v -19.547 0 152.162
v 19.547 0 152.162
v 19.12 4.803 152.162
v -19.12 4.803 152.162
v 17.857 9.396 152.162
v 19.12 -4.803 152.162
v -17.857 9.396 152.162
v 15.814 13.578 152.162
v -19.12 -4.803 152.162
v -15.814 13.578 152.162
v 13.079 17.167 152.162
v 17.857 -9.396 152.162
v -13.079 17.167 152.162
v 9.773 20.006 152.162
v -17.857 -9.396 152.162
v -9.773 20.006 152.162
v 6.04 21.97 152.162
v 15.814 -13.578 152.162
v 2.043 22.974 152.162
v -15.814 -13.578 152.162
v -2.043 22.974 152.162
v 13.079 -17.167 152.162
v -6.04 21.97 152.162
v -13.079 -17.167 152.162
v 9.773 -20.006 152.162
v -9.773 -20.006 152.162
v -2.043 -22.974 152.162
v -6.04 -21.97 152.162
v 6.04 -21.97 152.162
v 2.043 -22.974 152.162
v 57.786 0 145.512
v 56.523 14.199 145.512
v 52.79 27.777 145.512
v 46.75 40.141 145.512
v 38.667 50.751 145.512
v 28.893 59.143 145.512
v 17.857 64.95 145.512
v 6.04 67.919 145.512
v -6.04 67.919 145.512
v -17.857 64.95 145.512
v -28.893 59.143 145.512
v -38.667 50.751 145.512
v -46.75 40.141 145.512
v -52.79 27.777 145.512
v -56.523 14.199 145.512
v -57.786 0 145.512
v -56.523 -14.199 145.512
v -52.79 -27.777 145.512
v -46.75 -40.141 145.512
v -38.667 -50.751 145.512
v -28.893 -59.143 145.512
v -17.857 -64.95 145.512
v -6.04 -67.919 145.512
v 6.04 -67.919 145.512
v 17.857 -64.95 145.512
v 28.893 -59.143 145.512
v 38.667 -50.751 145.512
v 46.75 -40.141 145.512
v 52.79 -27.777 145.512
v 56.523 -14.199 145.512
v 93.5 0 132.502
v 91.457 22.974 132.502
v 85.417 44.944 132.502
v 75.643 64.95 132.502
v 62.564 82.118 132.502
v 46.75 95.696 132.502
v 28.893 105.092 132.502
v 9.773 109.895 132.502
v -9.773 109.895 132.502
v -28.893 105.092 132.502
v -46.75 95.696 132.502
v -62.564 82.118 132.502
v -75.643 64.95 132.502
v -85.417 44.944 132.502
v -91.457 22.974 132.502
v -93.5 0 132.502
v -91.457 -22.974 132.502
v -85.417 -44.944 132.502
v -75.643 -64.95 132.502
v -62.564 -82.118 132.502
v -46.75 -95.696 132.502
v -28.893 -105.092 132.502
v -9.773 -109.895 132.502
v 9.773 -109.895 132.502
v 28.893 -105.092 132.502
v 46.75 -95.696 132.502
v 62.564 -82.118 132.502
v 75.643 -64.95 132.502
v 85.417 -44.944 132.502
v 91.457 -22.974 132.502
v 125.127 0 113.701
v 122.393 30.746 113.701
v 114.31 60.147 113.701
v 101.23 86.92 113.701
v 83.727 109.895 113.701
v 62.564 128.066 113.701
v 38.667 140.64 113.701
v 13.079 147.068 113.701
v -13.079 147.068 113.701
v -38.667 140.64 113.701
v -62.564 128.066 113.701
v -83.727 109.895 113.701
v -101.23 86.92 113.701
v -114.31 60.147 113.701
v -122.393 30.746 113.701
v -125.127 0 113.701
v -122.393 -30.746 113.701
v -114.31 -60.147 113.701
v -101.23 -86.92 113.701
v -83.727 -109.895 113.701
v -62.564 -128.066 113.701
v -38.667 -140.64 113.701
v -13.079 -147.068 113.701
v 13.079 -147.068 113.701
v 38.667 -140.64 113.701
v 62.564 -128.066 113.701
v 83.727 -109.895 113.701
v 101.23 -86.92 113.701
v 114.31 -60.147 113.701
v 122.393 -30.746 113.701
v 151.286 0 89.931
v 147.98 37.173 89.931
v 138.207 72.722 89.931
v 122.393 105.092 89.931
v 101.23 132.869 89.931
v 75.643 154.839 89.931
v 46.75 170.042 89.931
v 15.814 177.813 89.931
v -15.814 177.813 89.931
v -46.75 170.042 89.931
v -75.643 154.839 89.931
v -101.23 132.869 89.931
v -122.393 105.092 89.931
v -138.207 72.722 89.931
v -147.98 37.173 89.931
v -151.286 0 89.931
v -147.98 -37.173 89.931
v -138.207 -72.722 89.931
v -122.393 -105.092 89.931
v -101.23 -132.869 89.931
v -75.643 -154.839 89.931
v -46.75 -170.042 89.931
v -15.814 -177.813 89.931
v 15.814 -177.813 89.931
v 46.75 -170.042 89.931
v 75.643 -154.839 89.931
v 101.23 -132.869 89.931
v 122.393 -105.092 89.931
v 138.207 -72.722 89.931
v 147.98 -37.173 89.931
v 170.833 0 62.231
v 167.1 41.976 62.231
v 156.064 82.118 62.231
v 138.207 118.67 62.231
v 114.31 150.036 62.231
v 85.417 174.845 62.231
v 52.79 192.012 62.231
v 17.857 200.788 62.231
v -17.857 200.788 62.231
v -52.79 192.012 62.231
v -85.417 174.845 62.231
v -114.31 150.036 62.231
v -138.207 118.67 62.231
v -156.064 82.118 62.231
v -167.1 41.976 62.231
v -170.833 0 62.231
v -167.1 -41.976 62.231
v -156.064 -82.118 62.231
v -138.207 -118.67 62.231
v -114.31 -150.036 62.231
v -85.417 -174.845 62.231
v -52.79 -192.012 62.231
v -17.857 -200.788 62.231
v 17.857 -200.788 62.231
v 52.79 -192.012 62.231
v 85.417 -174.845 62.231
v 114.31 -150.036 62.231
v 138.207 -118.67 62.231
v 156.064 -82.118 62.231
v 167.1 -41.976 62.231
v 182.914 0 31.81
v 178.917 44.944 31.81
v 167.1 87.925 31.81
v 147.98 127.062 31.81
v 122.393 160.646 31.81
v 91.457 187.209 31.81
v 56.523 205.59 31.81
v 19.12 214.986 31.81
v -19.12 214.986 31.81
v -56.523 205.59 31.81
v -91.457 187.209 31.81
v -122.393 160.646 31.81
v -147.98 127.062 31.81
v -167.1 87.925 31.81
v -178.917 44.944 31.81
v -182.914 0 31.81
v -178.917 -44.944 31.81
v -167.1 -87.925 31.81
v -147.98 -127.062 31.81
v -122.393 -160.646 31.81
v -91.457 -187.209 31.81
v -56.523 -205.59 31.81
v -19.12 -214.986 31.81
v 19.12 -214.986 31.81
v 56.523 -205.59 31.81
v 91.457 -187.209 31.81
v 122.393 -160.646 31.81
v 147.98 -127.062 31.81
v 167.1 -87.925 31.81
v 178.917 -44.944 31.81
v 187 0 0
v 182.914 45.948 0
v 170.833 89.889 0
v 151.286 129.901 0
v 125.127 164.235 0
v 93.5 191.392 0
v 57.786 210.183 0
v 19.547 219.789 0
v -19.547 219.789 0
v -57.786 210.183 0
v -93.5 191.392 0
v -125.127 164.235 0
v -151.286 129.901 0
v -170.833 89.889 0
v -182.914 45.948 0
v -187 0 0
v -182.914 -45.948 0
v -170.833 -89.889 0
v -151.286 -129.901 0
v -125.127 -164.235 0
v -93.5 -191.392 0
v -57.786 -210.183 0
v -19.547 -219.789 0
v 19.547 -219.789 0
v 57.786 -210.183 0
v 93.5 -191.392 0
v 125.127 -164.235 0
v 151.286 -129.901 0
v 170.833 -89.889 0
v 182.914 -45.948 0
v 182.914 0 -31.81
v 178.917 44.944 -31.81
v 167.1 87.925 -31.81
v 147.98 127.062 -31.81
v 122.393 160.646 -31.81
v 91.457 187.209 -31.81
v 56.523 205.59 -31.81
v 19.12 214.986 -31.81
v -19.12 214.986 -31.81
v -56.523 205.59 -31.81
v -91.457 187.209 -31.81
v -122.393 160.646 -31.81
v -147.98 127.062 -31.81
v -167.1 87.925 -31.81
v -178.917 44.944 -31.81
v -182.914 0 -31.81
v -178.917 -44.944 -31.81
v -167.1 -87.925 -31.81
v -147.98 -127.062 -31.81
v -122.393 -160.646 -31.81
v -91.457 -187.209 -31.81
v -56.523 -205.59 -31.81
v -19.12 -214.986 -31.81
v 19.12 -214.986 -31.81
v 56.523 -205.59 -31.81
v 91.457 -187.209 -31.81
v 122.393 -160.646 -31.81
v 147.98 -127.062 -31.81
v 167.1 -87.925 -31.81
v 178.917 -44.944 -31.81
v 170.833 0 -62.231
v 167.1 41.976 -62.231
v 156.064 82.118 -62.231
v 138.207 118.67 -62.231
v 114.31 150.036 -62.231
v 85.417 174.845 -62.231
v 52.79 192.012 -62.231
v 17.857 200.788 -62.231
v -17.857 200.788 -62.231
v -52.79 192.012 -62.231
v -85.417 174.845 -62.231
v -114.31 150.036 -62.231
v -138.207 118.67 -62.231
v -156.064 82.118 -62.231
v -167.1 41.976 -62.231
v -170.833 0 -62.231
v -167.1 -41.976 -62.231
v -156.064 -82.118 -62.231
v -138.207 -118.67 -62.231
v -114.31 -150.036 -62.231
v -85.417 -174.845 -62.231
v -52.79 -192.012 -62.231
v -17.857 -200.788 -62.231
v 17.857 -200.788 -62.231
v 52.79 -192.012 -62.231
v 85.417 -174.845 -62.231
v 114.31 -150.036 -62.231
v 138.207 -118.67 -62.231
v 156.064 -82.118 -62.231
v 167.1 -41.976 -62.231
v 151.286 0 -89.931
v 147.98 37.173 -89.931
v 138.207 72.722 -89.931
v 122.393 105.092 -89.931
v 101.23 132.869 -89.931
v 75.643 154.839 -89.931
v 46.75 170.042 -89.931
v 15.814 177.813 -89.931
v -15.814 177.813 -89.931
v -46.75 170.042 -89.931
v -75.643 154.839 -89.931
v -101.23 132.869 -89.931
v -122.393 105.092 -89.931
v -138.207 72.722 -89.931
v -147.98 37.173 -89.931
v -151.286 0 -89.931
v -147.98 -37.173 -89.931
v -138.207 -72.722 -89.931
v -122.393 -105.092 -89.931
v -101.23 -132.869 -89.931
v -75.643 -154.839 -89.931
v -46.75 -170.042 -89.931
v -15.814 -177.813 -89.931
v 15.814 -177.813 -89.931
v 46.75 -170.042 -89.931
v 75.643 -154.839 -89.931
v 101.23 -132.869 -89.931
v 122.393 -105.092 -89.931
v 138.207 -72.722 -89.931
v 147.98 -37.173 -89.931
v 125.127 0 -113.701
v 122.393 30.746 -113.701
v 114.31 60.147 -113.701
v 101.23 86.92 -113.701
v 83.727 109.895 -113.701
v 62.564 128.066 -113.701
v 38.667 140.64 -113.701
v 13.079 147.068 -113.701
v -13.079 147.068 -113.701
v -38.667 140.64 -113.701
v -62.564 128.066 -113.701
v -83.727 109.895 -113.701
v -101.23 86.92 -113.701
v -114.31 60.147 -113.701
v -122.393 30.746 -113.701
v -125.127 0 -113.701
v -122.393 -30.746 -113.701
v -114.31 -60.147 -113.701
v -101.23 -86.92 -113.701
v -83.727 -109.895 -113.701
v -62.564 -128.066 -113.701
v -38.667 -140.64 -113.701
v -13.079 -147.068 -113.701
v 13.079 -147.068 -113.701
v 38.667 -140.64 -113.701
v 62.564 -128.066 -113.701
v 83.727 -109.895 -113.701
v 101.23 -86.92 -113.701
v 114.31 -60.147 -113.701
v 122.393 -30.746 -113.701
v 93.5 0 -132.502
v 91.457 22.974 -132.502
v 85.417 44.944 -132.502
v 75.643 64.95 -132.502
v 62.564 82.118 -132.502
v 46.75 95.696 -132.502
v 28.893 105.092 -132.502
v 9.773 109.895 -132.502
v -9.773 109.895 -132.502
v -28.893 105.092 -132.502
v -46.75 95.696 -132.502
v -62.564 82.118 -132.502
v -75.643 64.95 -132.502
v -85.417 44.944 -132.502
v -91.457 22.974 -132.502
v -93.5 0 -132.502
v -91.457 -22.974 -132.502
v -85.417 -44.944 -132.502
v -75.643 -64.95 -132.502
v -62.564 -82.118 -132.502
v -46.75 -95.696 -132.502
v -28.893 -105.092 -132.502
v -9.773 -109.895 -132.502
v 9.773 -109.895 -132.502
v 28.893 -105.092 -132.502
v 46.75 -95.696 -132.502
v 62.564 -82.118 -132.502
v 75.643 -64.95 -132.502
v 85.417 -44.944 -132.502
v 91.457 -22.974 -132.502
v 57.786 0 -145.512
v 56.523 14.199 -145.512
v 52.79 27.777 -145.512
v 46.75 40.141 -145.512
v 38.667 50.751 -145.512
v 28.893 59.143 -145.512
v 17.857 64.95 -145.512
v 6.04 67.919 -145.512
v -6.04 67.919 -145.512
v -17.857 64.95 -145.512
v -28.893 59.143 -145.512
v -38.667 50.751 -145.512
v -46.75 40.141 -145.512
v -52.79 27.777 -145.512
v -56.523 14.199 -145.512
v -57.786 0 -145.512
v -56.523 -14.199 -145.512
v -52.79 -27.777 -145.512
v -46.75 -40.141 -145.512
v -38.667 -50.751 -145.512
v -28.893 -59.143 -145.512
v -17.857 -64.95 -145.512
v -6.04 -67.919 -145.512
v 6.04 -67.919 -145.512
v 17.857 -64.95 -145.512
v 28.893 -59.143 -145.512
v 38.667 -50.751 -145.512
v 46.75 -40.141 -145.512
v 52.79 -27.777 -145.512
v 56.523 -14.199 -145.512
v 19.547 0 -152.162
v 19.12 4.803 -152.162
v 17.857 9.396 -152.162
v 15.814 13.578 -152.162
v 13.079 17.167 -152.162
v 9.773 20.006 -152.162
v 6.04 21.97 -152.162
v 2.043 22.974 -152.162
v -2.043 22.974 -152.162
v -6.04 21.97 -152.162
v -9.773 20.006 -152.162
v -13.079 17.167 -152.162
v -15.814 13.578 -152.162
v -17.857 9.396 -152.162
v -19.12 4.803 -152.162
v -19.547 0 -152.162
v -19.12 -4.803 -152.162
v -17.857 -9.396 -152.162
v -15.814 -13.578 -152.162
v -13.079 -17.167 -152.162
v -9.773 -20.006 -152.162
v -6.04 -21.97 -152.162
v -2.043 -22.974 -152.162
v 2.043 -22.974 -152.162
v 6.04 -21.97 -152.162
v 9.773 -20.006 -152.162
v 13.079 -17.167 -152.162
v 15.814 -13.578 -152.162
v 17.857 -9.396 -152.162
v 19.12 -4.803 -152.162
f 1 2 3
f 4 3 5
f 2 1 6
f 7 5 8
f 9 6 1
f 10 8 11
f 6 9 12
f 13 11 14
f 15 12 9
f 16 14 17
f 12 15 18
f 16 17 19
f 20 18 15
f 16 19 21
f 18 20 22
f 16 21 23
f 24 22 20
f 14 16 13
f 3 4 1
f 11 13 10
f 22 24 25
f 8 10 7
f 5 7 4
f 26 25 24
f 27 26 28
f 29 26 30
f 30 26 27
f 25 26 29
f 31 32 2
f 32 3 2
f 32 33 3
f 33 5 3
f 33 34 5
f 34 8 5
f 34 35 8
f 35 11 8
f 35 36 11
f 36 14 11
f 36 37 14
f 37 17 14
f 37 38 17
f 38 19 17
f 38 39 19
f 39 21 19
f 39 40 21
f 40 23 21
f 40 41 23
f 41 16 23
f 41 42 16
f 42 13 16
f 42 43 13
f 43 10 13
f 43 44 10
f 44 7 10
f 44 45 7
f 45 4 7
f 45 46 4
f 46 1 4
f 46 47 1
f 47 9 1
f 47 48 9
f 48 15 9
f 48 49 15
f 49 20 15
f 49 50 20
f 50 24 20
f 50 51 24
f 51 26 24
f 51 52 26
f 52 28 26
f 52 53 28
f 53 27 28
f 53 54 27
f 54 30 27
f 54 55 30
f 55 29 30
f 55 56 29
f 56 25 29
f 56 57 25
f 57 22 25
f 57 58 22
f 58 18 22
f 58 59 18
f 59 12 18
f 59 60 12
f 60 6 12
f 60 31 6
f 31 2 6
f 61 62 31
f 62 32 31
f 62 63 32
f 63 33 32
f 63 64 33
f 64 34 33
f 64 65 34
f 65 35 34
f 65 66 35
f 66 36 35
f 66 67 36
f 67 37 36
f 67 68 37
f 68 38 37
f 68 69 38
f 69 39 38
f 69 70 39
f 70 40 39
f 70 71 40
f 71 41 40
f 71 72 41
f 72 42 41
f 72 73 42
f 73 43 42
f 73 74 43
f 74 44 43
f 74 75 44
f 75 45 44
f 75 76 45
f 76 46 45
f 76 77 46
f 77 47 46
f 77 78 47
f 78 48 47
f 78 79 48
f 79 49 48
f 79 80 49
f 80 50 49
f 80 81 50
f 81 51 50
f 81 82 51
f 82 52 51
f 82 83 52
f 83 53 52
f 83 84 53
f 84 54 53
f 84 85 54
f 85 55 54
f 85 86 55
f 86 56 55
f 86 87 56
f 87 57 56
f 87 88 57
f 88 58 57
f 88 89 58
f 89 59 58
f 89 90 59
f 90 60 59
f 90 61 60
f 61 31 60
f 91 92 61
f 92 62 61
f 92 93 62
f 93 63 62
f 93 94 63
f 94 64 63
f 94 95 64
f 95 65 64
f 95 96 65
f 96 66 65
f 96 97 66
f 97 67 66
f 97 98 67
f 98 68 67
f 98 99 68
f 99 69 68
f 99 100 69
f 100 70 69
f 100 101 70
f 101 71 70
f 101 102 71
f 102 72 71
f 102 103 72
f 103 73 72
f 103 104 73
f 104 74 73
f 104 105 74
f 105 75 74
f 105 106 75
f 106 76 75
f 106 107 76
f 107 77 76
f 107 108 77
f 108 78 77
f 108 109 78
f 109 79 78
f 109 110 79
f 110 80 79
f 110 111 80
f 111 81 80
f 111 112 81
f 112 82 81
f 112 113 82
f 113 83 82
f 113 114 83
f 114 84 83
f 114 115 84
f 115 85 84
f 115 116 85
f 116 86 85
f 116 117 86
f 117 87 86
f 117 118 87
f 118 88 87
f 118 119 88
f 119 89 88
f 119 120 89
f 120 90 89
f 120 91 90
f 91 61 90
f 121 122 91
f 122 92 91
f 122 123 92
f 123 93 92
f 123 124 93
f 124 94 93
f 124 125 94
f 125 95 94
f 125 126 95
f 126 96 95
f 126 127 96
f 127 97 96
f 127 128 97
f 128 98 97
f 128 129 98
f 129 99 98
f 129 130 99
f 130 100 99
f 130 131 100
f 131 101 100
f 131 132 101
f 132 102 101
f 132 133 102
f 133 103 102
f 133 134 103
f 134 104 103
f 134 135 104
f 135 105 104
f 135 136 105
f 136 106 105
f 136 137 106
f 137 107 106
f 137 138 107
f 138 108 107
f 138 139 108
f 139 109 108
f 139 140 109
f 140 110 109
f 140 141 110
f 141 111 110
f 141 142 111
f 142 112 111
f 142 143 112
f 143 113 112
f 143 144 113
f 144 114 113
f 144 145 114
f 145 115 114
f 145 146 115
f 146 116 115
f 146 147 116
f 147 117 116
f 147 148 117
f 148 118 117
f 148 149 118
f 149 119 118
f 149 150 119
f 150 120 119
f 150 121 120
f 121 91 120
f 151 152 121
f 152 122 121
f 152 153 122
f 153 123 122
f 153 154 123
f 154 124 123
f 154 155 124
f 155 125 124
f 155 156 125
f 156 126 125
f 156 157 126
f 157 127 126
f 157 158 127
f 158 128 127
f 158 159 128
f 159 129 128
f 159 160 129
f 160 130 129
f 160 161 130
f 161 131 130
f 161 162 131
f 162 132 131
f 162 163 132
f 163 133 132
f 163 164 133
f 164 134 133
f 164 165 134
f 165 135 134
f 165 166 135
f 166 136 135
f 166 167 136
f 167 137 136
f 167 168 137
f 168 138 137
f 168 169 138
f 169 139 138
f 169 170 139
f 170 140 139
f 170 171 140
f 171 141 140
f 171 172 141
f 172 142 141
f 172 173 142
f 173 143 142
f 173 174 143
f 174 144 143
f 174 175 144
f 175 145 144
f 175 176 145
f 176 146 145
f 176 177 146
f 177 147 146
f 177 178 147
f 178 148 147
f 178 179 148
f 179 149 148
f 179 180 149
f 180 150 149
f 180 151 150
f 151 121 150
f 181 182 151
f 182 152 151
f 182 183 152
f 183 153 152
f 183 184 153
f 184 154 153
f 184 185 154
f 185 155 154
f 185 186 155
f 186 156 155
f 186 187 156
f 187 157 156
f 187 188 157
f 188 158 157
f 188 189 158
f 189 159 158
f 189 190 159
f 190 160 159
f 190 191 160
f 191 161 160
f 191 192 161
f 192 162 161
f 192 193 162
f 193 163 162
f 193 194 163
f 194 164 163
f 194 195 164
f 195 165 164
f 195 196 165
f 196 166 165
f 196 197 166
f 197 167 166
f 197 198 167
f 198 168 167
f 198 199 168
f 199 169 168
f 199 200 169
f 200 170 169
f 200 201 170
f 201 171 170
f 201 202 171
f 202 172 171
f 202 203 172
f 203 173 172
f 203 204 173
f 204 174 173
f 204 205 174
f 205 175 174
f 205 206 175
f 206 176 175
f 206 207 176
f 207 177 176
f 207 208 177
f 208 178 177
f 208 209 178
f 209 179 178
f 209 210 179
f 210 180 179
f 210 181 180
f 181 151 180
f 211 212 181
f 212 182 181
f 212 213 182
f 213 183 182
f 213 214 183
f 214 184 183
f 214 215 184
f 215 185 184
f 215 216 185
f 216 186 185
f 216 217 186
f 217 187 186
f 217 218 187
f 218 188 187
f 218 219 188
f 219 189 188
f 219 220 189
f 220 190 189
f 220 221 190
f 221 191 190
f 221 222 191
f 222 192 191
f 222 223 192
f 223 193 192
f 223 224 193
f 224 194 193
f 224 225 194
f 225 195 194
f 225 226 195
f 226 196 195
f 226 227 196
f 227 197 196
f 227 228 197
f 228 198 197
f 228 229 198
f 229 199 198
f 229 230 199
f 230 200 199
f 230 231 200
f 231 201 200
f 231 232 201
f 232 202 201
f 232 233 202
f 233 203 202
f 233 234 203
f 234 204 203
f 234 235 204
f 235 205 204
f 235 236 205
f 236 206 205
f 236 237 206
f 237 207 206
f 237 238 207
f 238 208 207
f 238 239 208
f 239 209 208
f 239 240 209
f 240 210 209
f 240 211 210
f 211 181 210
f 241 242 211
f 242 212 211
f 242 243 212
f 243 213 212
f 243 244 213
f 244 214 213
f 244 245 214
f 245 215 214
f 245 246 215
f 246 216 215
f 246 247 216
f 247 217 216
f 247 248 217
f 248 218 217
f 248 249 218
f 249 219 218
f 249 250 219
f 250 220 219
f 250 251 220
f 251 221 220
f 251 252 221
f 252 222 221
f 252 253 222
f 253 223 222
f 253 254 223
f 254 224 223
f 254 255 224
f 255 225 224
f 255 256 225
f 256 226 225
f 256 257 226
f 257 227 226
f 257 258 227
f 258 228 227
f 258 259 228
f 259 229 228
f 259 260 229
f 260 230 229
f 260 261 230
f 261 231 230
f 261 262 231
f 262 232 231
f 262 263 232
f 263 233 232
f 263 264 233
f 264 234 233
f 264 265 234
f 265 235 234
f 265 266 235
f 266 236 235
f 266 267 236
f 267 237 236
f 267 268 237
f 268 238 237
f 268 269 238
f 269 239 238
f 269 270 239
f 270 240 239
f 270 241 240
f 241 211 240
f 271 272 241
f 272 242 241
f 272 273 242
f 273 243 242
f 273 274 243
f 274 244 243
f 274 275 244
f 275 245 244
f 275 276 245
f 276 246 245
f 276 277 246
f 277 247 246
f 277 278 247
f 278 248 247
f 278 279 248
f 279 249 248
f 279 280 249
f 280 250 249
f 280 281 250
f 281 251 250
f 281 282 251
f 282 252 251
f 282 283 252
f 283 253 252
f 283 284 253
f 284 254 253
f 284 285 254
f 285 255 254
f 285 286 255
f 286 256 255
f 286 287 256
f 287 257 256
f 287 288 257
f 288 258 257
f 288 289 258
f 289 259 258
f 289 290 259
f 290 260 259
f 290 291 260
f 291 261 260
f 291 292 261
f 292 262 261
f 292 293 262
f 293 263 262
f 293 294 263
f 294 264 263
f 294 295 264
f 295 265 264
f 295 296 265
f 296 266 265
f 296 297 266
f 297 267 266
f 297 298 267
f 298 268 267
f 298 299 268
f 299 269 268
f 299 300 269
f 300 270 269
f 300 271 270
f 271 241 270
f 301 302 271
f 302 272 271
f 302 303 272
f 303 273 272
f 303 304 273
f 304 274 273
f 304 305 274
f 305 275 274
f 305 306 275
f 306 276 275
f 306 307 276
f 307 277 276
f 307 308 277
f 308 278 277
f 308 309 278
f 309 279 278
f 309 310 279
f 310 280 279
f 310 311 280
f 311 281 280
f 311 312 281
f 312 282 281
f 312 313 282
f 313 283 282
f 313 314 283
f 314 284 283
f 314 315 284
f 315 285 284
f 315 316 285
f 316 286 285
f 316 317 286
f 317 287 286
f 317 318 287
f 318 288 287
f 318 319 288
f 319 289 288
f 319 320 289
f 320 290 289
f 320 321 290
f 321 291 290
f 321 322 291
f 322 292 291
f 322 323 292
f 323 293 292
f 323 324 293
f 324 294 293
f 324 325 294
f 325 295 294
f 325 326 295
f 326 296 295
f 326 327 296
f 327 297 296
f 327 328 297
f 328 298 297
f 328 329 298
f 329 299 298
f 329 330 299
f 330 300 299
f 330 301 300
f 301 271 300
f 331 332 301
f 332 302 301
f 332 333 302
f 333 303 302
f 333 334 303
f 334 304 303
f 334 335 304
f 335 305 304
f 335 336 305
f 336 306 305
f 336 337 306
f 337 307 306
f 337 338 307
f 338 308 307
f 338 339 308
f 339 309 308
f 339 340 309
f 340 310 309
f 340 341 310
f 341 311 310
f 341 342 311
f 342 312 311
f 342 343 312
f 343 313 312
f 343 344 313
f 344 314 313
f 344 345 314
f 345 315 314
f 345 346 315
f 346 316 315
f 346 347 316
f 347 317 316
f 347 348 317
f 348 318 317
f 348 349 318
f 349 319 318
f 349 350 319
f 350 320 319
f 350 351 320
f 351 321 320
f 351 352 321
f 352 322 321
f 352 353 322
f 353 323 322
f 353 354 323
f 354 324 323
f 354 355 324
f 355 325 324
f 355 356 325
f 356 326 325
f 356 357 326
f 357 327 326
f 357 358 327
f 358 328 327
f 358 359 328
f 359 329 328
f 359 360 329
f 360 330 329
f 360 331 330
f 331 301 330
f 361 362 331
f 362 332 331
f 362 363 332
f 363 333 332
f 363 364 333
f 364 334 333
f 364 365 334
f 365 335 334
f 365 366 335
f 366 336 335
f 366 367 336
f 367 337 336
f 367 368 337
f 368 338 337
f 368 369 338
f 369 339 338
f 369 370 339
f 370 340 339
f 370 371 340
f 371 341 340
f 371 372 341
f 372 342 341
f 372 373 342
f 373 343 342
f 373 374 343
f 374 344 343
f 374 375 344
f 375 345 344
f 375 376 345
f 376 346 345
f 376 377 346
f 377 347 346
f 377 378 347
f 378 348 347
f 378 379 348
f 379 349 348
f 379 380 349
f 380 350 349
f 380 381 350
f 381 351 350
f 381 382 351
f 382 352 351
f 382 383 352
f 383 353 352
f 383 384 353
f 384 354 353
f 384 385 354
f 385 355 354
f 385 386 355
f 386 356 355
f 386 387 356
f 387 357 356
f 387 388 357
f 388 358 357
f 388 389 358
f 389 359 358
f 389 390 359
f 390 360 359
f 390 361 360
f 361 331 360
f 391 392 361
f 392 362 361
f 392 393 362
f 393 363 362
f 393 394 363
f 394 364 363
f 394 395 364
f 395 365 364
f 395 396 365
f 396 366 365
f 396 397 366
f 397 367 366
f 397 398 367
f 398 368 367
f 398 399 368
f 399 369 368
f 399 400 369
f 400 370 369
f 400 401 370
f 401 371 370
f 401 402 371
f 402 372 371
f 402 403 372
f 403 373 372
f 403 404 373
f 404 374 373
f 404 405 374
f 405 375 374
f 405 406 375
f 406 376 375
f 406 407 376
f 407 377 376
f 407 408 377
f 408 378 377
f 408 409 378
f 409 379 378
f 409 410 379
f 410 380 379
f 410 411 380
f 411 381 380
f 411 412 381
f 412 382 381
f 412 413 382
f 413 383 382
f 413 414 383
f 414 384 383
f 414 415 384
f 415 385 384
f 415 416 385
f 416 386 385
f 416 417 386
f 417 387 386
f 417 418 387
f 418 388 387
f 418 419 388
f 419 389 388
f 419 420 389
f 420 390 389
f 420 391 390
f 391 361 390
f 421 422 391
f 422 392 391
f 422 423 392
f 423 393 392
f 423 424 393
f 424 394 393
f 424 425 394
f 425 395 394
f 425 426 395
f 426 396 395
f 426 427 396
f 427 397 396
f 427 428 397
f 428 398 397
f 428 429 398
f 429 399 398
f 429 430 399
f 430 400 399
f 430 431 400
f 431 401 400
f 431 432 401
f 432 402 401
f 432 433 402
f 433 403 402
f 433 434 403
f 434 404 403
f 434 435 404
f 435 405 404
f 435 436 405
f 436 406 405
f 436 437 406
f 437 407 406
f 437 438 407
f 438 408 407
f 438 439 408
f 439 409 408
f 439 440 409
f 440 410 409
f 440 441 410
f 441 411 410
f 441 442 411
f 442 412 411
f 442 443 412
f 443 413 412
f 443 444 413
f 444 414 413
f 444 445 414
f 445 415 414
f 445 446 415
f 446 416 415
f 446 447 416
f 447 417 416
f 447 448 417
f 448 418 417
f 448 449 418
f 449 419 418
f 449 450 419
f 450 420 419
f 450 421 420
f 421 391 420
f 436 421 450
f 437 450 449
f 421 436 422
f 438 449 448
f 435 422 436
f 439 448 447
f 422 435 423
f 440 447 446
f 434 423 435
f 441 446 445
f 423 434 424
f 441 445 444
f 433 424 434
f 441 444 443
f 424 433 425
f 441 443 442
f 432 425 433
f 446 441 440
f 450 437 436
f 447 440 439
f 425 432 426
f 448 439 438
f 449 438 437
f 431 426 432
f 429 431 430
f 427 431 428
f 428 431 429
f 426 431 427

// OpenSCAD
// Generated by SolidPython 1.0.1 on 2020-07-29 00:46:49


scale(v = [11, 13, 9]) {
	sphere(r = 17);
}
/***********************************************
*********      SolidPython code:      **********
************************************************
 
# import packages: SolidPython
from solid import *
from solid.utils import *
from itertools import chain, combinations, permutations


class Resize:

    def __init__(self, scad_file):
        self.scad_file = scad_file
        #self.scad_file = import_scad(scad_file)
        # cone/cylinder param:
        self.r1 = 0
        self.r2 = 0
        self.h = 0
        # rectangular prism param:
        self.w = 0
        self.l = 0
        # ellipse param:
        self.r = 0

    # import OpenScad code (file name corresponds to shape)


    # classify shape + parameters
    def assign(self, param1, param2, param3):
        if self.scad_file == 'cone.scad':
            self.r1 = param1
            self.r2 = param2
            self.h = param3
        elif self.scad_file == 'cylinder.scad':
            self.r1 = param1
            self.r2 = param2
            self.h = param3
        elif self.scad_file == 'rectangularPrism.scad':
            self.h = param1
            self.l = param2
            self.w = param3
        else:
            self.r = param1
            self.h = param2

    # resize parameters
    def iterate(self):
        x = range(3, 20, 2)
        i = 1
        if self.scad_file == 'cone.scad':
            tempList = list(permutations(x, 2))
            for temp in tempList:
                param1 = temp[0]
                param2 = temp[1]
                filepath = 'produced_scad_files/' + 'cone' + str(param1) + '_' + str(param2) + '_' + '.scad'
                scad_render_to_file(cylinder(h=param1, r1=param2, r2=0), filepath)

        elif self.scad_file == 'cylinder.scad':
            tempList = list(permutations(x, 3))
            for temp in tempList:
                param1 = temp[0]
                param2 = temp[1]
                filepath = 'produced_scad_files/' + 'cylinder' + str(param1) + '_' + str(param2) + '_' + '.scad'
                scad_render_to_file(cylinder(h=param1, r1=param2, r2=param2), filepath)

        elif self.scad_file == 'rectangularPrism.scad':
            tempList = list(permutations(x, 3))
            for temp in tempList:
                param1 = temp[0]
                param2 = temp[1]
                param3 = temp[2]
                filepath = 'produced_scad_files/' + 'rectangularPrism' + str(param1) + '_' + str(param2) + '_' + str(
                    param3) + '.scad'
                scad_render_to_file(cube(size=(param1, param2, param3)), filepath)

        elif self.scad_file == 'ellipse.scad':
            tempList = list(permutations(x, 4))
            for temp in tempList:
                param1 = temp[0]
                param2 = temp[1]
                param3 = temp[2]
                param4 = temp[3]
                filepath = 'produced_scad_files/' + 'ellipse' + str(param1) + '_' + str(param2) + '_' + str(param3) + '_' + str(param4) + '.scad'
                scad_render_to_file(scale([param1, param2, param3])(sphere(r=param4)), filepath)

    def render_to_scadfile(self):
        scad_render_to_file(scad, 'example.scad') 
 
************************************************/
